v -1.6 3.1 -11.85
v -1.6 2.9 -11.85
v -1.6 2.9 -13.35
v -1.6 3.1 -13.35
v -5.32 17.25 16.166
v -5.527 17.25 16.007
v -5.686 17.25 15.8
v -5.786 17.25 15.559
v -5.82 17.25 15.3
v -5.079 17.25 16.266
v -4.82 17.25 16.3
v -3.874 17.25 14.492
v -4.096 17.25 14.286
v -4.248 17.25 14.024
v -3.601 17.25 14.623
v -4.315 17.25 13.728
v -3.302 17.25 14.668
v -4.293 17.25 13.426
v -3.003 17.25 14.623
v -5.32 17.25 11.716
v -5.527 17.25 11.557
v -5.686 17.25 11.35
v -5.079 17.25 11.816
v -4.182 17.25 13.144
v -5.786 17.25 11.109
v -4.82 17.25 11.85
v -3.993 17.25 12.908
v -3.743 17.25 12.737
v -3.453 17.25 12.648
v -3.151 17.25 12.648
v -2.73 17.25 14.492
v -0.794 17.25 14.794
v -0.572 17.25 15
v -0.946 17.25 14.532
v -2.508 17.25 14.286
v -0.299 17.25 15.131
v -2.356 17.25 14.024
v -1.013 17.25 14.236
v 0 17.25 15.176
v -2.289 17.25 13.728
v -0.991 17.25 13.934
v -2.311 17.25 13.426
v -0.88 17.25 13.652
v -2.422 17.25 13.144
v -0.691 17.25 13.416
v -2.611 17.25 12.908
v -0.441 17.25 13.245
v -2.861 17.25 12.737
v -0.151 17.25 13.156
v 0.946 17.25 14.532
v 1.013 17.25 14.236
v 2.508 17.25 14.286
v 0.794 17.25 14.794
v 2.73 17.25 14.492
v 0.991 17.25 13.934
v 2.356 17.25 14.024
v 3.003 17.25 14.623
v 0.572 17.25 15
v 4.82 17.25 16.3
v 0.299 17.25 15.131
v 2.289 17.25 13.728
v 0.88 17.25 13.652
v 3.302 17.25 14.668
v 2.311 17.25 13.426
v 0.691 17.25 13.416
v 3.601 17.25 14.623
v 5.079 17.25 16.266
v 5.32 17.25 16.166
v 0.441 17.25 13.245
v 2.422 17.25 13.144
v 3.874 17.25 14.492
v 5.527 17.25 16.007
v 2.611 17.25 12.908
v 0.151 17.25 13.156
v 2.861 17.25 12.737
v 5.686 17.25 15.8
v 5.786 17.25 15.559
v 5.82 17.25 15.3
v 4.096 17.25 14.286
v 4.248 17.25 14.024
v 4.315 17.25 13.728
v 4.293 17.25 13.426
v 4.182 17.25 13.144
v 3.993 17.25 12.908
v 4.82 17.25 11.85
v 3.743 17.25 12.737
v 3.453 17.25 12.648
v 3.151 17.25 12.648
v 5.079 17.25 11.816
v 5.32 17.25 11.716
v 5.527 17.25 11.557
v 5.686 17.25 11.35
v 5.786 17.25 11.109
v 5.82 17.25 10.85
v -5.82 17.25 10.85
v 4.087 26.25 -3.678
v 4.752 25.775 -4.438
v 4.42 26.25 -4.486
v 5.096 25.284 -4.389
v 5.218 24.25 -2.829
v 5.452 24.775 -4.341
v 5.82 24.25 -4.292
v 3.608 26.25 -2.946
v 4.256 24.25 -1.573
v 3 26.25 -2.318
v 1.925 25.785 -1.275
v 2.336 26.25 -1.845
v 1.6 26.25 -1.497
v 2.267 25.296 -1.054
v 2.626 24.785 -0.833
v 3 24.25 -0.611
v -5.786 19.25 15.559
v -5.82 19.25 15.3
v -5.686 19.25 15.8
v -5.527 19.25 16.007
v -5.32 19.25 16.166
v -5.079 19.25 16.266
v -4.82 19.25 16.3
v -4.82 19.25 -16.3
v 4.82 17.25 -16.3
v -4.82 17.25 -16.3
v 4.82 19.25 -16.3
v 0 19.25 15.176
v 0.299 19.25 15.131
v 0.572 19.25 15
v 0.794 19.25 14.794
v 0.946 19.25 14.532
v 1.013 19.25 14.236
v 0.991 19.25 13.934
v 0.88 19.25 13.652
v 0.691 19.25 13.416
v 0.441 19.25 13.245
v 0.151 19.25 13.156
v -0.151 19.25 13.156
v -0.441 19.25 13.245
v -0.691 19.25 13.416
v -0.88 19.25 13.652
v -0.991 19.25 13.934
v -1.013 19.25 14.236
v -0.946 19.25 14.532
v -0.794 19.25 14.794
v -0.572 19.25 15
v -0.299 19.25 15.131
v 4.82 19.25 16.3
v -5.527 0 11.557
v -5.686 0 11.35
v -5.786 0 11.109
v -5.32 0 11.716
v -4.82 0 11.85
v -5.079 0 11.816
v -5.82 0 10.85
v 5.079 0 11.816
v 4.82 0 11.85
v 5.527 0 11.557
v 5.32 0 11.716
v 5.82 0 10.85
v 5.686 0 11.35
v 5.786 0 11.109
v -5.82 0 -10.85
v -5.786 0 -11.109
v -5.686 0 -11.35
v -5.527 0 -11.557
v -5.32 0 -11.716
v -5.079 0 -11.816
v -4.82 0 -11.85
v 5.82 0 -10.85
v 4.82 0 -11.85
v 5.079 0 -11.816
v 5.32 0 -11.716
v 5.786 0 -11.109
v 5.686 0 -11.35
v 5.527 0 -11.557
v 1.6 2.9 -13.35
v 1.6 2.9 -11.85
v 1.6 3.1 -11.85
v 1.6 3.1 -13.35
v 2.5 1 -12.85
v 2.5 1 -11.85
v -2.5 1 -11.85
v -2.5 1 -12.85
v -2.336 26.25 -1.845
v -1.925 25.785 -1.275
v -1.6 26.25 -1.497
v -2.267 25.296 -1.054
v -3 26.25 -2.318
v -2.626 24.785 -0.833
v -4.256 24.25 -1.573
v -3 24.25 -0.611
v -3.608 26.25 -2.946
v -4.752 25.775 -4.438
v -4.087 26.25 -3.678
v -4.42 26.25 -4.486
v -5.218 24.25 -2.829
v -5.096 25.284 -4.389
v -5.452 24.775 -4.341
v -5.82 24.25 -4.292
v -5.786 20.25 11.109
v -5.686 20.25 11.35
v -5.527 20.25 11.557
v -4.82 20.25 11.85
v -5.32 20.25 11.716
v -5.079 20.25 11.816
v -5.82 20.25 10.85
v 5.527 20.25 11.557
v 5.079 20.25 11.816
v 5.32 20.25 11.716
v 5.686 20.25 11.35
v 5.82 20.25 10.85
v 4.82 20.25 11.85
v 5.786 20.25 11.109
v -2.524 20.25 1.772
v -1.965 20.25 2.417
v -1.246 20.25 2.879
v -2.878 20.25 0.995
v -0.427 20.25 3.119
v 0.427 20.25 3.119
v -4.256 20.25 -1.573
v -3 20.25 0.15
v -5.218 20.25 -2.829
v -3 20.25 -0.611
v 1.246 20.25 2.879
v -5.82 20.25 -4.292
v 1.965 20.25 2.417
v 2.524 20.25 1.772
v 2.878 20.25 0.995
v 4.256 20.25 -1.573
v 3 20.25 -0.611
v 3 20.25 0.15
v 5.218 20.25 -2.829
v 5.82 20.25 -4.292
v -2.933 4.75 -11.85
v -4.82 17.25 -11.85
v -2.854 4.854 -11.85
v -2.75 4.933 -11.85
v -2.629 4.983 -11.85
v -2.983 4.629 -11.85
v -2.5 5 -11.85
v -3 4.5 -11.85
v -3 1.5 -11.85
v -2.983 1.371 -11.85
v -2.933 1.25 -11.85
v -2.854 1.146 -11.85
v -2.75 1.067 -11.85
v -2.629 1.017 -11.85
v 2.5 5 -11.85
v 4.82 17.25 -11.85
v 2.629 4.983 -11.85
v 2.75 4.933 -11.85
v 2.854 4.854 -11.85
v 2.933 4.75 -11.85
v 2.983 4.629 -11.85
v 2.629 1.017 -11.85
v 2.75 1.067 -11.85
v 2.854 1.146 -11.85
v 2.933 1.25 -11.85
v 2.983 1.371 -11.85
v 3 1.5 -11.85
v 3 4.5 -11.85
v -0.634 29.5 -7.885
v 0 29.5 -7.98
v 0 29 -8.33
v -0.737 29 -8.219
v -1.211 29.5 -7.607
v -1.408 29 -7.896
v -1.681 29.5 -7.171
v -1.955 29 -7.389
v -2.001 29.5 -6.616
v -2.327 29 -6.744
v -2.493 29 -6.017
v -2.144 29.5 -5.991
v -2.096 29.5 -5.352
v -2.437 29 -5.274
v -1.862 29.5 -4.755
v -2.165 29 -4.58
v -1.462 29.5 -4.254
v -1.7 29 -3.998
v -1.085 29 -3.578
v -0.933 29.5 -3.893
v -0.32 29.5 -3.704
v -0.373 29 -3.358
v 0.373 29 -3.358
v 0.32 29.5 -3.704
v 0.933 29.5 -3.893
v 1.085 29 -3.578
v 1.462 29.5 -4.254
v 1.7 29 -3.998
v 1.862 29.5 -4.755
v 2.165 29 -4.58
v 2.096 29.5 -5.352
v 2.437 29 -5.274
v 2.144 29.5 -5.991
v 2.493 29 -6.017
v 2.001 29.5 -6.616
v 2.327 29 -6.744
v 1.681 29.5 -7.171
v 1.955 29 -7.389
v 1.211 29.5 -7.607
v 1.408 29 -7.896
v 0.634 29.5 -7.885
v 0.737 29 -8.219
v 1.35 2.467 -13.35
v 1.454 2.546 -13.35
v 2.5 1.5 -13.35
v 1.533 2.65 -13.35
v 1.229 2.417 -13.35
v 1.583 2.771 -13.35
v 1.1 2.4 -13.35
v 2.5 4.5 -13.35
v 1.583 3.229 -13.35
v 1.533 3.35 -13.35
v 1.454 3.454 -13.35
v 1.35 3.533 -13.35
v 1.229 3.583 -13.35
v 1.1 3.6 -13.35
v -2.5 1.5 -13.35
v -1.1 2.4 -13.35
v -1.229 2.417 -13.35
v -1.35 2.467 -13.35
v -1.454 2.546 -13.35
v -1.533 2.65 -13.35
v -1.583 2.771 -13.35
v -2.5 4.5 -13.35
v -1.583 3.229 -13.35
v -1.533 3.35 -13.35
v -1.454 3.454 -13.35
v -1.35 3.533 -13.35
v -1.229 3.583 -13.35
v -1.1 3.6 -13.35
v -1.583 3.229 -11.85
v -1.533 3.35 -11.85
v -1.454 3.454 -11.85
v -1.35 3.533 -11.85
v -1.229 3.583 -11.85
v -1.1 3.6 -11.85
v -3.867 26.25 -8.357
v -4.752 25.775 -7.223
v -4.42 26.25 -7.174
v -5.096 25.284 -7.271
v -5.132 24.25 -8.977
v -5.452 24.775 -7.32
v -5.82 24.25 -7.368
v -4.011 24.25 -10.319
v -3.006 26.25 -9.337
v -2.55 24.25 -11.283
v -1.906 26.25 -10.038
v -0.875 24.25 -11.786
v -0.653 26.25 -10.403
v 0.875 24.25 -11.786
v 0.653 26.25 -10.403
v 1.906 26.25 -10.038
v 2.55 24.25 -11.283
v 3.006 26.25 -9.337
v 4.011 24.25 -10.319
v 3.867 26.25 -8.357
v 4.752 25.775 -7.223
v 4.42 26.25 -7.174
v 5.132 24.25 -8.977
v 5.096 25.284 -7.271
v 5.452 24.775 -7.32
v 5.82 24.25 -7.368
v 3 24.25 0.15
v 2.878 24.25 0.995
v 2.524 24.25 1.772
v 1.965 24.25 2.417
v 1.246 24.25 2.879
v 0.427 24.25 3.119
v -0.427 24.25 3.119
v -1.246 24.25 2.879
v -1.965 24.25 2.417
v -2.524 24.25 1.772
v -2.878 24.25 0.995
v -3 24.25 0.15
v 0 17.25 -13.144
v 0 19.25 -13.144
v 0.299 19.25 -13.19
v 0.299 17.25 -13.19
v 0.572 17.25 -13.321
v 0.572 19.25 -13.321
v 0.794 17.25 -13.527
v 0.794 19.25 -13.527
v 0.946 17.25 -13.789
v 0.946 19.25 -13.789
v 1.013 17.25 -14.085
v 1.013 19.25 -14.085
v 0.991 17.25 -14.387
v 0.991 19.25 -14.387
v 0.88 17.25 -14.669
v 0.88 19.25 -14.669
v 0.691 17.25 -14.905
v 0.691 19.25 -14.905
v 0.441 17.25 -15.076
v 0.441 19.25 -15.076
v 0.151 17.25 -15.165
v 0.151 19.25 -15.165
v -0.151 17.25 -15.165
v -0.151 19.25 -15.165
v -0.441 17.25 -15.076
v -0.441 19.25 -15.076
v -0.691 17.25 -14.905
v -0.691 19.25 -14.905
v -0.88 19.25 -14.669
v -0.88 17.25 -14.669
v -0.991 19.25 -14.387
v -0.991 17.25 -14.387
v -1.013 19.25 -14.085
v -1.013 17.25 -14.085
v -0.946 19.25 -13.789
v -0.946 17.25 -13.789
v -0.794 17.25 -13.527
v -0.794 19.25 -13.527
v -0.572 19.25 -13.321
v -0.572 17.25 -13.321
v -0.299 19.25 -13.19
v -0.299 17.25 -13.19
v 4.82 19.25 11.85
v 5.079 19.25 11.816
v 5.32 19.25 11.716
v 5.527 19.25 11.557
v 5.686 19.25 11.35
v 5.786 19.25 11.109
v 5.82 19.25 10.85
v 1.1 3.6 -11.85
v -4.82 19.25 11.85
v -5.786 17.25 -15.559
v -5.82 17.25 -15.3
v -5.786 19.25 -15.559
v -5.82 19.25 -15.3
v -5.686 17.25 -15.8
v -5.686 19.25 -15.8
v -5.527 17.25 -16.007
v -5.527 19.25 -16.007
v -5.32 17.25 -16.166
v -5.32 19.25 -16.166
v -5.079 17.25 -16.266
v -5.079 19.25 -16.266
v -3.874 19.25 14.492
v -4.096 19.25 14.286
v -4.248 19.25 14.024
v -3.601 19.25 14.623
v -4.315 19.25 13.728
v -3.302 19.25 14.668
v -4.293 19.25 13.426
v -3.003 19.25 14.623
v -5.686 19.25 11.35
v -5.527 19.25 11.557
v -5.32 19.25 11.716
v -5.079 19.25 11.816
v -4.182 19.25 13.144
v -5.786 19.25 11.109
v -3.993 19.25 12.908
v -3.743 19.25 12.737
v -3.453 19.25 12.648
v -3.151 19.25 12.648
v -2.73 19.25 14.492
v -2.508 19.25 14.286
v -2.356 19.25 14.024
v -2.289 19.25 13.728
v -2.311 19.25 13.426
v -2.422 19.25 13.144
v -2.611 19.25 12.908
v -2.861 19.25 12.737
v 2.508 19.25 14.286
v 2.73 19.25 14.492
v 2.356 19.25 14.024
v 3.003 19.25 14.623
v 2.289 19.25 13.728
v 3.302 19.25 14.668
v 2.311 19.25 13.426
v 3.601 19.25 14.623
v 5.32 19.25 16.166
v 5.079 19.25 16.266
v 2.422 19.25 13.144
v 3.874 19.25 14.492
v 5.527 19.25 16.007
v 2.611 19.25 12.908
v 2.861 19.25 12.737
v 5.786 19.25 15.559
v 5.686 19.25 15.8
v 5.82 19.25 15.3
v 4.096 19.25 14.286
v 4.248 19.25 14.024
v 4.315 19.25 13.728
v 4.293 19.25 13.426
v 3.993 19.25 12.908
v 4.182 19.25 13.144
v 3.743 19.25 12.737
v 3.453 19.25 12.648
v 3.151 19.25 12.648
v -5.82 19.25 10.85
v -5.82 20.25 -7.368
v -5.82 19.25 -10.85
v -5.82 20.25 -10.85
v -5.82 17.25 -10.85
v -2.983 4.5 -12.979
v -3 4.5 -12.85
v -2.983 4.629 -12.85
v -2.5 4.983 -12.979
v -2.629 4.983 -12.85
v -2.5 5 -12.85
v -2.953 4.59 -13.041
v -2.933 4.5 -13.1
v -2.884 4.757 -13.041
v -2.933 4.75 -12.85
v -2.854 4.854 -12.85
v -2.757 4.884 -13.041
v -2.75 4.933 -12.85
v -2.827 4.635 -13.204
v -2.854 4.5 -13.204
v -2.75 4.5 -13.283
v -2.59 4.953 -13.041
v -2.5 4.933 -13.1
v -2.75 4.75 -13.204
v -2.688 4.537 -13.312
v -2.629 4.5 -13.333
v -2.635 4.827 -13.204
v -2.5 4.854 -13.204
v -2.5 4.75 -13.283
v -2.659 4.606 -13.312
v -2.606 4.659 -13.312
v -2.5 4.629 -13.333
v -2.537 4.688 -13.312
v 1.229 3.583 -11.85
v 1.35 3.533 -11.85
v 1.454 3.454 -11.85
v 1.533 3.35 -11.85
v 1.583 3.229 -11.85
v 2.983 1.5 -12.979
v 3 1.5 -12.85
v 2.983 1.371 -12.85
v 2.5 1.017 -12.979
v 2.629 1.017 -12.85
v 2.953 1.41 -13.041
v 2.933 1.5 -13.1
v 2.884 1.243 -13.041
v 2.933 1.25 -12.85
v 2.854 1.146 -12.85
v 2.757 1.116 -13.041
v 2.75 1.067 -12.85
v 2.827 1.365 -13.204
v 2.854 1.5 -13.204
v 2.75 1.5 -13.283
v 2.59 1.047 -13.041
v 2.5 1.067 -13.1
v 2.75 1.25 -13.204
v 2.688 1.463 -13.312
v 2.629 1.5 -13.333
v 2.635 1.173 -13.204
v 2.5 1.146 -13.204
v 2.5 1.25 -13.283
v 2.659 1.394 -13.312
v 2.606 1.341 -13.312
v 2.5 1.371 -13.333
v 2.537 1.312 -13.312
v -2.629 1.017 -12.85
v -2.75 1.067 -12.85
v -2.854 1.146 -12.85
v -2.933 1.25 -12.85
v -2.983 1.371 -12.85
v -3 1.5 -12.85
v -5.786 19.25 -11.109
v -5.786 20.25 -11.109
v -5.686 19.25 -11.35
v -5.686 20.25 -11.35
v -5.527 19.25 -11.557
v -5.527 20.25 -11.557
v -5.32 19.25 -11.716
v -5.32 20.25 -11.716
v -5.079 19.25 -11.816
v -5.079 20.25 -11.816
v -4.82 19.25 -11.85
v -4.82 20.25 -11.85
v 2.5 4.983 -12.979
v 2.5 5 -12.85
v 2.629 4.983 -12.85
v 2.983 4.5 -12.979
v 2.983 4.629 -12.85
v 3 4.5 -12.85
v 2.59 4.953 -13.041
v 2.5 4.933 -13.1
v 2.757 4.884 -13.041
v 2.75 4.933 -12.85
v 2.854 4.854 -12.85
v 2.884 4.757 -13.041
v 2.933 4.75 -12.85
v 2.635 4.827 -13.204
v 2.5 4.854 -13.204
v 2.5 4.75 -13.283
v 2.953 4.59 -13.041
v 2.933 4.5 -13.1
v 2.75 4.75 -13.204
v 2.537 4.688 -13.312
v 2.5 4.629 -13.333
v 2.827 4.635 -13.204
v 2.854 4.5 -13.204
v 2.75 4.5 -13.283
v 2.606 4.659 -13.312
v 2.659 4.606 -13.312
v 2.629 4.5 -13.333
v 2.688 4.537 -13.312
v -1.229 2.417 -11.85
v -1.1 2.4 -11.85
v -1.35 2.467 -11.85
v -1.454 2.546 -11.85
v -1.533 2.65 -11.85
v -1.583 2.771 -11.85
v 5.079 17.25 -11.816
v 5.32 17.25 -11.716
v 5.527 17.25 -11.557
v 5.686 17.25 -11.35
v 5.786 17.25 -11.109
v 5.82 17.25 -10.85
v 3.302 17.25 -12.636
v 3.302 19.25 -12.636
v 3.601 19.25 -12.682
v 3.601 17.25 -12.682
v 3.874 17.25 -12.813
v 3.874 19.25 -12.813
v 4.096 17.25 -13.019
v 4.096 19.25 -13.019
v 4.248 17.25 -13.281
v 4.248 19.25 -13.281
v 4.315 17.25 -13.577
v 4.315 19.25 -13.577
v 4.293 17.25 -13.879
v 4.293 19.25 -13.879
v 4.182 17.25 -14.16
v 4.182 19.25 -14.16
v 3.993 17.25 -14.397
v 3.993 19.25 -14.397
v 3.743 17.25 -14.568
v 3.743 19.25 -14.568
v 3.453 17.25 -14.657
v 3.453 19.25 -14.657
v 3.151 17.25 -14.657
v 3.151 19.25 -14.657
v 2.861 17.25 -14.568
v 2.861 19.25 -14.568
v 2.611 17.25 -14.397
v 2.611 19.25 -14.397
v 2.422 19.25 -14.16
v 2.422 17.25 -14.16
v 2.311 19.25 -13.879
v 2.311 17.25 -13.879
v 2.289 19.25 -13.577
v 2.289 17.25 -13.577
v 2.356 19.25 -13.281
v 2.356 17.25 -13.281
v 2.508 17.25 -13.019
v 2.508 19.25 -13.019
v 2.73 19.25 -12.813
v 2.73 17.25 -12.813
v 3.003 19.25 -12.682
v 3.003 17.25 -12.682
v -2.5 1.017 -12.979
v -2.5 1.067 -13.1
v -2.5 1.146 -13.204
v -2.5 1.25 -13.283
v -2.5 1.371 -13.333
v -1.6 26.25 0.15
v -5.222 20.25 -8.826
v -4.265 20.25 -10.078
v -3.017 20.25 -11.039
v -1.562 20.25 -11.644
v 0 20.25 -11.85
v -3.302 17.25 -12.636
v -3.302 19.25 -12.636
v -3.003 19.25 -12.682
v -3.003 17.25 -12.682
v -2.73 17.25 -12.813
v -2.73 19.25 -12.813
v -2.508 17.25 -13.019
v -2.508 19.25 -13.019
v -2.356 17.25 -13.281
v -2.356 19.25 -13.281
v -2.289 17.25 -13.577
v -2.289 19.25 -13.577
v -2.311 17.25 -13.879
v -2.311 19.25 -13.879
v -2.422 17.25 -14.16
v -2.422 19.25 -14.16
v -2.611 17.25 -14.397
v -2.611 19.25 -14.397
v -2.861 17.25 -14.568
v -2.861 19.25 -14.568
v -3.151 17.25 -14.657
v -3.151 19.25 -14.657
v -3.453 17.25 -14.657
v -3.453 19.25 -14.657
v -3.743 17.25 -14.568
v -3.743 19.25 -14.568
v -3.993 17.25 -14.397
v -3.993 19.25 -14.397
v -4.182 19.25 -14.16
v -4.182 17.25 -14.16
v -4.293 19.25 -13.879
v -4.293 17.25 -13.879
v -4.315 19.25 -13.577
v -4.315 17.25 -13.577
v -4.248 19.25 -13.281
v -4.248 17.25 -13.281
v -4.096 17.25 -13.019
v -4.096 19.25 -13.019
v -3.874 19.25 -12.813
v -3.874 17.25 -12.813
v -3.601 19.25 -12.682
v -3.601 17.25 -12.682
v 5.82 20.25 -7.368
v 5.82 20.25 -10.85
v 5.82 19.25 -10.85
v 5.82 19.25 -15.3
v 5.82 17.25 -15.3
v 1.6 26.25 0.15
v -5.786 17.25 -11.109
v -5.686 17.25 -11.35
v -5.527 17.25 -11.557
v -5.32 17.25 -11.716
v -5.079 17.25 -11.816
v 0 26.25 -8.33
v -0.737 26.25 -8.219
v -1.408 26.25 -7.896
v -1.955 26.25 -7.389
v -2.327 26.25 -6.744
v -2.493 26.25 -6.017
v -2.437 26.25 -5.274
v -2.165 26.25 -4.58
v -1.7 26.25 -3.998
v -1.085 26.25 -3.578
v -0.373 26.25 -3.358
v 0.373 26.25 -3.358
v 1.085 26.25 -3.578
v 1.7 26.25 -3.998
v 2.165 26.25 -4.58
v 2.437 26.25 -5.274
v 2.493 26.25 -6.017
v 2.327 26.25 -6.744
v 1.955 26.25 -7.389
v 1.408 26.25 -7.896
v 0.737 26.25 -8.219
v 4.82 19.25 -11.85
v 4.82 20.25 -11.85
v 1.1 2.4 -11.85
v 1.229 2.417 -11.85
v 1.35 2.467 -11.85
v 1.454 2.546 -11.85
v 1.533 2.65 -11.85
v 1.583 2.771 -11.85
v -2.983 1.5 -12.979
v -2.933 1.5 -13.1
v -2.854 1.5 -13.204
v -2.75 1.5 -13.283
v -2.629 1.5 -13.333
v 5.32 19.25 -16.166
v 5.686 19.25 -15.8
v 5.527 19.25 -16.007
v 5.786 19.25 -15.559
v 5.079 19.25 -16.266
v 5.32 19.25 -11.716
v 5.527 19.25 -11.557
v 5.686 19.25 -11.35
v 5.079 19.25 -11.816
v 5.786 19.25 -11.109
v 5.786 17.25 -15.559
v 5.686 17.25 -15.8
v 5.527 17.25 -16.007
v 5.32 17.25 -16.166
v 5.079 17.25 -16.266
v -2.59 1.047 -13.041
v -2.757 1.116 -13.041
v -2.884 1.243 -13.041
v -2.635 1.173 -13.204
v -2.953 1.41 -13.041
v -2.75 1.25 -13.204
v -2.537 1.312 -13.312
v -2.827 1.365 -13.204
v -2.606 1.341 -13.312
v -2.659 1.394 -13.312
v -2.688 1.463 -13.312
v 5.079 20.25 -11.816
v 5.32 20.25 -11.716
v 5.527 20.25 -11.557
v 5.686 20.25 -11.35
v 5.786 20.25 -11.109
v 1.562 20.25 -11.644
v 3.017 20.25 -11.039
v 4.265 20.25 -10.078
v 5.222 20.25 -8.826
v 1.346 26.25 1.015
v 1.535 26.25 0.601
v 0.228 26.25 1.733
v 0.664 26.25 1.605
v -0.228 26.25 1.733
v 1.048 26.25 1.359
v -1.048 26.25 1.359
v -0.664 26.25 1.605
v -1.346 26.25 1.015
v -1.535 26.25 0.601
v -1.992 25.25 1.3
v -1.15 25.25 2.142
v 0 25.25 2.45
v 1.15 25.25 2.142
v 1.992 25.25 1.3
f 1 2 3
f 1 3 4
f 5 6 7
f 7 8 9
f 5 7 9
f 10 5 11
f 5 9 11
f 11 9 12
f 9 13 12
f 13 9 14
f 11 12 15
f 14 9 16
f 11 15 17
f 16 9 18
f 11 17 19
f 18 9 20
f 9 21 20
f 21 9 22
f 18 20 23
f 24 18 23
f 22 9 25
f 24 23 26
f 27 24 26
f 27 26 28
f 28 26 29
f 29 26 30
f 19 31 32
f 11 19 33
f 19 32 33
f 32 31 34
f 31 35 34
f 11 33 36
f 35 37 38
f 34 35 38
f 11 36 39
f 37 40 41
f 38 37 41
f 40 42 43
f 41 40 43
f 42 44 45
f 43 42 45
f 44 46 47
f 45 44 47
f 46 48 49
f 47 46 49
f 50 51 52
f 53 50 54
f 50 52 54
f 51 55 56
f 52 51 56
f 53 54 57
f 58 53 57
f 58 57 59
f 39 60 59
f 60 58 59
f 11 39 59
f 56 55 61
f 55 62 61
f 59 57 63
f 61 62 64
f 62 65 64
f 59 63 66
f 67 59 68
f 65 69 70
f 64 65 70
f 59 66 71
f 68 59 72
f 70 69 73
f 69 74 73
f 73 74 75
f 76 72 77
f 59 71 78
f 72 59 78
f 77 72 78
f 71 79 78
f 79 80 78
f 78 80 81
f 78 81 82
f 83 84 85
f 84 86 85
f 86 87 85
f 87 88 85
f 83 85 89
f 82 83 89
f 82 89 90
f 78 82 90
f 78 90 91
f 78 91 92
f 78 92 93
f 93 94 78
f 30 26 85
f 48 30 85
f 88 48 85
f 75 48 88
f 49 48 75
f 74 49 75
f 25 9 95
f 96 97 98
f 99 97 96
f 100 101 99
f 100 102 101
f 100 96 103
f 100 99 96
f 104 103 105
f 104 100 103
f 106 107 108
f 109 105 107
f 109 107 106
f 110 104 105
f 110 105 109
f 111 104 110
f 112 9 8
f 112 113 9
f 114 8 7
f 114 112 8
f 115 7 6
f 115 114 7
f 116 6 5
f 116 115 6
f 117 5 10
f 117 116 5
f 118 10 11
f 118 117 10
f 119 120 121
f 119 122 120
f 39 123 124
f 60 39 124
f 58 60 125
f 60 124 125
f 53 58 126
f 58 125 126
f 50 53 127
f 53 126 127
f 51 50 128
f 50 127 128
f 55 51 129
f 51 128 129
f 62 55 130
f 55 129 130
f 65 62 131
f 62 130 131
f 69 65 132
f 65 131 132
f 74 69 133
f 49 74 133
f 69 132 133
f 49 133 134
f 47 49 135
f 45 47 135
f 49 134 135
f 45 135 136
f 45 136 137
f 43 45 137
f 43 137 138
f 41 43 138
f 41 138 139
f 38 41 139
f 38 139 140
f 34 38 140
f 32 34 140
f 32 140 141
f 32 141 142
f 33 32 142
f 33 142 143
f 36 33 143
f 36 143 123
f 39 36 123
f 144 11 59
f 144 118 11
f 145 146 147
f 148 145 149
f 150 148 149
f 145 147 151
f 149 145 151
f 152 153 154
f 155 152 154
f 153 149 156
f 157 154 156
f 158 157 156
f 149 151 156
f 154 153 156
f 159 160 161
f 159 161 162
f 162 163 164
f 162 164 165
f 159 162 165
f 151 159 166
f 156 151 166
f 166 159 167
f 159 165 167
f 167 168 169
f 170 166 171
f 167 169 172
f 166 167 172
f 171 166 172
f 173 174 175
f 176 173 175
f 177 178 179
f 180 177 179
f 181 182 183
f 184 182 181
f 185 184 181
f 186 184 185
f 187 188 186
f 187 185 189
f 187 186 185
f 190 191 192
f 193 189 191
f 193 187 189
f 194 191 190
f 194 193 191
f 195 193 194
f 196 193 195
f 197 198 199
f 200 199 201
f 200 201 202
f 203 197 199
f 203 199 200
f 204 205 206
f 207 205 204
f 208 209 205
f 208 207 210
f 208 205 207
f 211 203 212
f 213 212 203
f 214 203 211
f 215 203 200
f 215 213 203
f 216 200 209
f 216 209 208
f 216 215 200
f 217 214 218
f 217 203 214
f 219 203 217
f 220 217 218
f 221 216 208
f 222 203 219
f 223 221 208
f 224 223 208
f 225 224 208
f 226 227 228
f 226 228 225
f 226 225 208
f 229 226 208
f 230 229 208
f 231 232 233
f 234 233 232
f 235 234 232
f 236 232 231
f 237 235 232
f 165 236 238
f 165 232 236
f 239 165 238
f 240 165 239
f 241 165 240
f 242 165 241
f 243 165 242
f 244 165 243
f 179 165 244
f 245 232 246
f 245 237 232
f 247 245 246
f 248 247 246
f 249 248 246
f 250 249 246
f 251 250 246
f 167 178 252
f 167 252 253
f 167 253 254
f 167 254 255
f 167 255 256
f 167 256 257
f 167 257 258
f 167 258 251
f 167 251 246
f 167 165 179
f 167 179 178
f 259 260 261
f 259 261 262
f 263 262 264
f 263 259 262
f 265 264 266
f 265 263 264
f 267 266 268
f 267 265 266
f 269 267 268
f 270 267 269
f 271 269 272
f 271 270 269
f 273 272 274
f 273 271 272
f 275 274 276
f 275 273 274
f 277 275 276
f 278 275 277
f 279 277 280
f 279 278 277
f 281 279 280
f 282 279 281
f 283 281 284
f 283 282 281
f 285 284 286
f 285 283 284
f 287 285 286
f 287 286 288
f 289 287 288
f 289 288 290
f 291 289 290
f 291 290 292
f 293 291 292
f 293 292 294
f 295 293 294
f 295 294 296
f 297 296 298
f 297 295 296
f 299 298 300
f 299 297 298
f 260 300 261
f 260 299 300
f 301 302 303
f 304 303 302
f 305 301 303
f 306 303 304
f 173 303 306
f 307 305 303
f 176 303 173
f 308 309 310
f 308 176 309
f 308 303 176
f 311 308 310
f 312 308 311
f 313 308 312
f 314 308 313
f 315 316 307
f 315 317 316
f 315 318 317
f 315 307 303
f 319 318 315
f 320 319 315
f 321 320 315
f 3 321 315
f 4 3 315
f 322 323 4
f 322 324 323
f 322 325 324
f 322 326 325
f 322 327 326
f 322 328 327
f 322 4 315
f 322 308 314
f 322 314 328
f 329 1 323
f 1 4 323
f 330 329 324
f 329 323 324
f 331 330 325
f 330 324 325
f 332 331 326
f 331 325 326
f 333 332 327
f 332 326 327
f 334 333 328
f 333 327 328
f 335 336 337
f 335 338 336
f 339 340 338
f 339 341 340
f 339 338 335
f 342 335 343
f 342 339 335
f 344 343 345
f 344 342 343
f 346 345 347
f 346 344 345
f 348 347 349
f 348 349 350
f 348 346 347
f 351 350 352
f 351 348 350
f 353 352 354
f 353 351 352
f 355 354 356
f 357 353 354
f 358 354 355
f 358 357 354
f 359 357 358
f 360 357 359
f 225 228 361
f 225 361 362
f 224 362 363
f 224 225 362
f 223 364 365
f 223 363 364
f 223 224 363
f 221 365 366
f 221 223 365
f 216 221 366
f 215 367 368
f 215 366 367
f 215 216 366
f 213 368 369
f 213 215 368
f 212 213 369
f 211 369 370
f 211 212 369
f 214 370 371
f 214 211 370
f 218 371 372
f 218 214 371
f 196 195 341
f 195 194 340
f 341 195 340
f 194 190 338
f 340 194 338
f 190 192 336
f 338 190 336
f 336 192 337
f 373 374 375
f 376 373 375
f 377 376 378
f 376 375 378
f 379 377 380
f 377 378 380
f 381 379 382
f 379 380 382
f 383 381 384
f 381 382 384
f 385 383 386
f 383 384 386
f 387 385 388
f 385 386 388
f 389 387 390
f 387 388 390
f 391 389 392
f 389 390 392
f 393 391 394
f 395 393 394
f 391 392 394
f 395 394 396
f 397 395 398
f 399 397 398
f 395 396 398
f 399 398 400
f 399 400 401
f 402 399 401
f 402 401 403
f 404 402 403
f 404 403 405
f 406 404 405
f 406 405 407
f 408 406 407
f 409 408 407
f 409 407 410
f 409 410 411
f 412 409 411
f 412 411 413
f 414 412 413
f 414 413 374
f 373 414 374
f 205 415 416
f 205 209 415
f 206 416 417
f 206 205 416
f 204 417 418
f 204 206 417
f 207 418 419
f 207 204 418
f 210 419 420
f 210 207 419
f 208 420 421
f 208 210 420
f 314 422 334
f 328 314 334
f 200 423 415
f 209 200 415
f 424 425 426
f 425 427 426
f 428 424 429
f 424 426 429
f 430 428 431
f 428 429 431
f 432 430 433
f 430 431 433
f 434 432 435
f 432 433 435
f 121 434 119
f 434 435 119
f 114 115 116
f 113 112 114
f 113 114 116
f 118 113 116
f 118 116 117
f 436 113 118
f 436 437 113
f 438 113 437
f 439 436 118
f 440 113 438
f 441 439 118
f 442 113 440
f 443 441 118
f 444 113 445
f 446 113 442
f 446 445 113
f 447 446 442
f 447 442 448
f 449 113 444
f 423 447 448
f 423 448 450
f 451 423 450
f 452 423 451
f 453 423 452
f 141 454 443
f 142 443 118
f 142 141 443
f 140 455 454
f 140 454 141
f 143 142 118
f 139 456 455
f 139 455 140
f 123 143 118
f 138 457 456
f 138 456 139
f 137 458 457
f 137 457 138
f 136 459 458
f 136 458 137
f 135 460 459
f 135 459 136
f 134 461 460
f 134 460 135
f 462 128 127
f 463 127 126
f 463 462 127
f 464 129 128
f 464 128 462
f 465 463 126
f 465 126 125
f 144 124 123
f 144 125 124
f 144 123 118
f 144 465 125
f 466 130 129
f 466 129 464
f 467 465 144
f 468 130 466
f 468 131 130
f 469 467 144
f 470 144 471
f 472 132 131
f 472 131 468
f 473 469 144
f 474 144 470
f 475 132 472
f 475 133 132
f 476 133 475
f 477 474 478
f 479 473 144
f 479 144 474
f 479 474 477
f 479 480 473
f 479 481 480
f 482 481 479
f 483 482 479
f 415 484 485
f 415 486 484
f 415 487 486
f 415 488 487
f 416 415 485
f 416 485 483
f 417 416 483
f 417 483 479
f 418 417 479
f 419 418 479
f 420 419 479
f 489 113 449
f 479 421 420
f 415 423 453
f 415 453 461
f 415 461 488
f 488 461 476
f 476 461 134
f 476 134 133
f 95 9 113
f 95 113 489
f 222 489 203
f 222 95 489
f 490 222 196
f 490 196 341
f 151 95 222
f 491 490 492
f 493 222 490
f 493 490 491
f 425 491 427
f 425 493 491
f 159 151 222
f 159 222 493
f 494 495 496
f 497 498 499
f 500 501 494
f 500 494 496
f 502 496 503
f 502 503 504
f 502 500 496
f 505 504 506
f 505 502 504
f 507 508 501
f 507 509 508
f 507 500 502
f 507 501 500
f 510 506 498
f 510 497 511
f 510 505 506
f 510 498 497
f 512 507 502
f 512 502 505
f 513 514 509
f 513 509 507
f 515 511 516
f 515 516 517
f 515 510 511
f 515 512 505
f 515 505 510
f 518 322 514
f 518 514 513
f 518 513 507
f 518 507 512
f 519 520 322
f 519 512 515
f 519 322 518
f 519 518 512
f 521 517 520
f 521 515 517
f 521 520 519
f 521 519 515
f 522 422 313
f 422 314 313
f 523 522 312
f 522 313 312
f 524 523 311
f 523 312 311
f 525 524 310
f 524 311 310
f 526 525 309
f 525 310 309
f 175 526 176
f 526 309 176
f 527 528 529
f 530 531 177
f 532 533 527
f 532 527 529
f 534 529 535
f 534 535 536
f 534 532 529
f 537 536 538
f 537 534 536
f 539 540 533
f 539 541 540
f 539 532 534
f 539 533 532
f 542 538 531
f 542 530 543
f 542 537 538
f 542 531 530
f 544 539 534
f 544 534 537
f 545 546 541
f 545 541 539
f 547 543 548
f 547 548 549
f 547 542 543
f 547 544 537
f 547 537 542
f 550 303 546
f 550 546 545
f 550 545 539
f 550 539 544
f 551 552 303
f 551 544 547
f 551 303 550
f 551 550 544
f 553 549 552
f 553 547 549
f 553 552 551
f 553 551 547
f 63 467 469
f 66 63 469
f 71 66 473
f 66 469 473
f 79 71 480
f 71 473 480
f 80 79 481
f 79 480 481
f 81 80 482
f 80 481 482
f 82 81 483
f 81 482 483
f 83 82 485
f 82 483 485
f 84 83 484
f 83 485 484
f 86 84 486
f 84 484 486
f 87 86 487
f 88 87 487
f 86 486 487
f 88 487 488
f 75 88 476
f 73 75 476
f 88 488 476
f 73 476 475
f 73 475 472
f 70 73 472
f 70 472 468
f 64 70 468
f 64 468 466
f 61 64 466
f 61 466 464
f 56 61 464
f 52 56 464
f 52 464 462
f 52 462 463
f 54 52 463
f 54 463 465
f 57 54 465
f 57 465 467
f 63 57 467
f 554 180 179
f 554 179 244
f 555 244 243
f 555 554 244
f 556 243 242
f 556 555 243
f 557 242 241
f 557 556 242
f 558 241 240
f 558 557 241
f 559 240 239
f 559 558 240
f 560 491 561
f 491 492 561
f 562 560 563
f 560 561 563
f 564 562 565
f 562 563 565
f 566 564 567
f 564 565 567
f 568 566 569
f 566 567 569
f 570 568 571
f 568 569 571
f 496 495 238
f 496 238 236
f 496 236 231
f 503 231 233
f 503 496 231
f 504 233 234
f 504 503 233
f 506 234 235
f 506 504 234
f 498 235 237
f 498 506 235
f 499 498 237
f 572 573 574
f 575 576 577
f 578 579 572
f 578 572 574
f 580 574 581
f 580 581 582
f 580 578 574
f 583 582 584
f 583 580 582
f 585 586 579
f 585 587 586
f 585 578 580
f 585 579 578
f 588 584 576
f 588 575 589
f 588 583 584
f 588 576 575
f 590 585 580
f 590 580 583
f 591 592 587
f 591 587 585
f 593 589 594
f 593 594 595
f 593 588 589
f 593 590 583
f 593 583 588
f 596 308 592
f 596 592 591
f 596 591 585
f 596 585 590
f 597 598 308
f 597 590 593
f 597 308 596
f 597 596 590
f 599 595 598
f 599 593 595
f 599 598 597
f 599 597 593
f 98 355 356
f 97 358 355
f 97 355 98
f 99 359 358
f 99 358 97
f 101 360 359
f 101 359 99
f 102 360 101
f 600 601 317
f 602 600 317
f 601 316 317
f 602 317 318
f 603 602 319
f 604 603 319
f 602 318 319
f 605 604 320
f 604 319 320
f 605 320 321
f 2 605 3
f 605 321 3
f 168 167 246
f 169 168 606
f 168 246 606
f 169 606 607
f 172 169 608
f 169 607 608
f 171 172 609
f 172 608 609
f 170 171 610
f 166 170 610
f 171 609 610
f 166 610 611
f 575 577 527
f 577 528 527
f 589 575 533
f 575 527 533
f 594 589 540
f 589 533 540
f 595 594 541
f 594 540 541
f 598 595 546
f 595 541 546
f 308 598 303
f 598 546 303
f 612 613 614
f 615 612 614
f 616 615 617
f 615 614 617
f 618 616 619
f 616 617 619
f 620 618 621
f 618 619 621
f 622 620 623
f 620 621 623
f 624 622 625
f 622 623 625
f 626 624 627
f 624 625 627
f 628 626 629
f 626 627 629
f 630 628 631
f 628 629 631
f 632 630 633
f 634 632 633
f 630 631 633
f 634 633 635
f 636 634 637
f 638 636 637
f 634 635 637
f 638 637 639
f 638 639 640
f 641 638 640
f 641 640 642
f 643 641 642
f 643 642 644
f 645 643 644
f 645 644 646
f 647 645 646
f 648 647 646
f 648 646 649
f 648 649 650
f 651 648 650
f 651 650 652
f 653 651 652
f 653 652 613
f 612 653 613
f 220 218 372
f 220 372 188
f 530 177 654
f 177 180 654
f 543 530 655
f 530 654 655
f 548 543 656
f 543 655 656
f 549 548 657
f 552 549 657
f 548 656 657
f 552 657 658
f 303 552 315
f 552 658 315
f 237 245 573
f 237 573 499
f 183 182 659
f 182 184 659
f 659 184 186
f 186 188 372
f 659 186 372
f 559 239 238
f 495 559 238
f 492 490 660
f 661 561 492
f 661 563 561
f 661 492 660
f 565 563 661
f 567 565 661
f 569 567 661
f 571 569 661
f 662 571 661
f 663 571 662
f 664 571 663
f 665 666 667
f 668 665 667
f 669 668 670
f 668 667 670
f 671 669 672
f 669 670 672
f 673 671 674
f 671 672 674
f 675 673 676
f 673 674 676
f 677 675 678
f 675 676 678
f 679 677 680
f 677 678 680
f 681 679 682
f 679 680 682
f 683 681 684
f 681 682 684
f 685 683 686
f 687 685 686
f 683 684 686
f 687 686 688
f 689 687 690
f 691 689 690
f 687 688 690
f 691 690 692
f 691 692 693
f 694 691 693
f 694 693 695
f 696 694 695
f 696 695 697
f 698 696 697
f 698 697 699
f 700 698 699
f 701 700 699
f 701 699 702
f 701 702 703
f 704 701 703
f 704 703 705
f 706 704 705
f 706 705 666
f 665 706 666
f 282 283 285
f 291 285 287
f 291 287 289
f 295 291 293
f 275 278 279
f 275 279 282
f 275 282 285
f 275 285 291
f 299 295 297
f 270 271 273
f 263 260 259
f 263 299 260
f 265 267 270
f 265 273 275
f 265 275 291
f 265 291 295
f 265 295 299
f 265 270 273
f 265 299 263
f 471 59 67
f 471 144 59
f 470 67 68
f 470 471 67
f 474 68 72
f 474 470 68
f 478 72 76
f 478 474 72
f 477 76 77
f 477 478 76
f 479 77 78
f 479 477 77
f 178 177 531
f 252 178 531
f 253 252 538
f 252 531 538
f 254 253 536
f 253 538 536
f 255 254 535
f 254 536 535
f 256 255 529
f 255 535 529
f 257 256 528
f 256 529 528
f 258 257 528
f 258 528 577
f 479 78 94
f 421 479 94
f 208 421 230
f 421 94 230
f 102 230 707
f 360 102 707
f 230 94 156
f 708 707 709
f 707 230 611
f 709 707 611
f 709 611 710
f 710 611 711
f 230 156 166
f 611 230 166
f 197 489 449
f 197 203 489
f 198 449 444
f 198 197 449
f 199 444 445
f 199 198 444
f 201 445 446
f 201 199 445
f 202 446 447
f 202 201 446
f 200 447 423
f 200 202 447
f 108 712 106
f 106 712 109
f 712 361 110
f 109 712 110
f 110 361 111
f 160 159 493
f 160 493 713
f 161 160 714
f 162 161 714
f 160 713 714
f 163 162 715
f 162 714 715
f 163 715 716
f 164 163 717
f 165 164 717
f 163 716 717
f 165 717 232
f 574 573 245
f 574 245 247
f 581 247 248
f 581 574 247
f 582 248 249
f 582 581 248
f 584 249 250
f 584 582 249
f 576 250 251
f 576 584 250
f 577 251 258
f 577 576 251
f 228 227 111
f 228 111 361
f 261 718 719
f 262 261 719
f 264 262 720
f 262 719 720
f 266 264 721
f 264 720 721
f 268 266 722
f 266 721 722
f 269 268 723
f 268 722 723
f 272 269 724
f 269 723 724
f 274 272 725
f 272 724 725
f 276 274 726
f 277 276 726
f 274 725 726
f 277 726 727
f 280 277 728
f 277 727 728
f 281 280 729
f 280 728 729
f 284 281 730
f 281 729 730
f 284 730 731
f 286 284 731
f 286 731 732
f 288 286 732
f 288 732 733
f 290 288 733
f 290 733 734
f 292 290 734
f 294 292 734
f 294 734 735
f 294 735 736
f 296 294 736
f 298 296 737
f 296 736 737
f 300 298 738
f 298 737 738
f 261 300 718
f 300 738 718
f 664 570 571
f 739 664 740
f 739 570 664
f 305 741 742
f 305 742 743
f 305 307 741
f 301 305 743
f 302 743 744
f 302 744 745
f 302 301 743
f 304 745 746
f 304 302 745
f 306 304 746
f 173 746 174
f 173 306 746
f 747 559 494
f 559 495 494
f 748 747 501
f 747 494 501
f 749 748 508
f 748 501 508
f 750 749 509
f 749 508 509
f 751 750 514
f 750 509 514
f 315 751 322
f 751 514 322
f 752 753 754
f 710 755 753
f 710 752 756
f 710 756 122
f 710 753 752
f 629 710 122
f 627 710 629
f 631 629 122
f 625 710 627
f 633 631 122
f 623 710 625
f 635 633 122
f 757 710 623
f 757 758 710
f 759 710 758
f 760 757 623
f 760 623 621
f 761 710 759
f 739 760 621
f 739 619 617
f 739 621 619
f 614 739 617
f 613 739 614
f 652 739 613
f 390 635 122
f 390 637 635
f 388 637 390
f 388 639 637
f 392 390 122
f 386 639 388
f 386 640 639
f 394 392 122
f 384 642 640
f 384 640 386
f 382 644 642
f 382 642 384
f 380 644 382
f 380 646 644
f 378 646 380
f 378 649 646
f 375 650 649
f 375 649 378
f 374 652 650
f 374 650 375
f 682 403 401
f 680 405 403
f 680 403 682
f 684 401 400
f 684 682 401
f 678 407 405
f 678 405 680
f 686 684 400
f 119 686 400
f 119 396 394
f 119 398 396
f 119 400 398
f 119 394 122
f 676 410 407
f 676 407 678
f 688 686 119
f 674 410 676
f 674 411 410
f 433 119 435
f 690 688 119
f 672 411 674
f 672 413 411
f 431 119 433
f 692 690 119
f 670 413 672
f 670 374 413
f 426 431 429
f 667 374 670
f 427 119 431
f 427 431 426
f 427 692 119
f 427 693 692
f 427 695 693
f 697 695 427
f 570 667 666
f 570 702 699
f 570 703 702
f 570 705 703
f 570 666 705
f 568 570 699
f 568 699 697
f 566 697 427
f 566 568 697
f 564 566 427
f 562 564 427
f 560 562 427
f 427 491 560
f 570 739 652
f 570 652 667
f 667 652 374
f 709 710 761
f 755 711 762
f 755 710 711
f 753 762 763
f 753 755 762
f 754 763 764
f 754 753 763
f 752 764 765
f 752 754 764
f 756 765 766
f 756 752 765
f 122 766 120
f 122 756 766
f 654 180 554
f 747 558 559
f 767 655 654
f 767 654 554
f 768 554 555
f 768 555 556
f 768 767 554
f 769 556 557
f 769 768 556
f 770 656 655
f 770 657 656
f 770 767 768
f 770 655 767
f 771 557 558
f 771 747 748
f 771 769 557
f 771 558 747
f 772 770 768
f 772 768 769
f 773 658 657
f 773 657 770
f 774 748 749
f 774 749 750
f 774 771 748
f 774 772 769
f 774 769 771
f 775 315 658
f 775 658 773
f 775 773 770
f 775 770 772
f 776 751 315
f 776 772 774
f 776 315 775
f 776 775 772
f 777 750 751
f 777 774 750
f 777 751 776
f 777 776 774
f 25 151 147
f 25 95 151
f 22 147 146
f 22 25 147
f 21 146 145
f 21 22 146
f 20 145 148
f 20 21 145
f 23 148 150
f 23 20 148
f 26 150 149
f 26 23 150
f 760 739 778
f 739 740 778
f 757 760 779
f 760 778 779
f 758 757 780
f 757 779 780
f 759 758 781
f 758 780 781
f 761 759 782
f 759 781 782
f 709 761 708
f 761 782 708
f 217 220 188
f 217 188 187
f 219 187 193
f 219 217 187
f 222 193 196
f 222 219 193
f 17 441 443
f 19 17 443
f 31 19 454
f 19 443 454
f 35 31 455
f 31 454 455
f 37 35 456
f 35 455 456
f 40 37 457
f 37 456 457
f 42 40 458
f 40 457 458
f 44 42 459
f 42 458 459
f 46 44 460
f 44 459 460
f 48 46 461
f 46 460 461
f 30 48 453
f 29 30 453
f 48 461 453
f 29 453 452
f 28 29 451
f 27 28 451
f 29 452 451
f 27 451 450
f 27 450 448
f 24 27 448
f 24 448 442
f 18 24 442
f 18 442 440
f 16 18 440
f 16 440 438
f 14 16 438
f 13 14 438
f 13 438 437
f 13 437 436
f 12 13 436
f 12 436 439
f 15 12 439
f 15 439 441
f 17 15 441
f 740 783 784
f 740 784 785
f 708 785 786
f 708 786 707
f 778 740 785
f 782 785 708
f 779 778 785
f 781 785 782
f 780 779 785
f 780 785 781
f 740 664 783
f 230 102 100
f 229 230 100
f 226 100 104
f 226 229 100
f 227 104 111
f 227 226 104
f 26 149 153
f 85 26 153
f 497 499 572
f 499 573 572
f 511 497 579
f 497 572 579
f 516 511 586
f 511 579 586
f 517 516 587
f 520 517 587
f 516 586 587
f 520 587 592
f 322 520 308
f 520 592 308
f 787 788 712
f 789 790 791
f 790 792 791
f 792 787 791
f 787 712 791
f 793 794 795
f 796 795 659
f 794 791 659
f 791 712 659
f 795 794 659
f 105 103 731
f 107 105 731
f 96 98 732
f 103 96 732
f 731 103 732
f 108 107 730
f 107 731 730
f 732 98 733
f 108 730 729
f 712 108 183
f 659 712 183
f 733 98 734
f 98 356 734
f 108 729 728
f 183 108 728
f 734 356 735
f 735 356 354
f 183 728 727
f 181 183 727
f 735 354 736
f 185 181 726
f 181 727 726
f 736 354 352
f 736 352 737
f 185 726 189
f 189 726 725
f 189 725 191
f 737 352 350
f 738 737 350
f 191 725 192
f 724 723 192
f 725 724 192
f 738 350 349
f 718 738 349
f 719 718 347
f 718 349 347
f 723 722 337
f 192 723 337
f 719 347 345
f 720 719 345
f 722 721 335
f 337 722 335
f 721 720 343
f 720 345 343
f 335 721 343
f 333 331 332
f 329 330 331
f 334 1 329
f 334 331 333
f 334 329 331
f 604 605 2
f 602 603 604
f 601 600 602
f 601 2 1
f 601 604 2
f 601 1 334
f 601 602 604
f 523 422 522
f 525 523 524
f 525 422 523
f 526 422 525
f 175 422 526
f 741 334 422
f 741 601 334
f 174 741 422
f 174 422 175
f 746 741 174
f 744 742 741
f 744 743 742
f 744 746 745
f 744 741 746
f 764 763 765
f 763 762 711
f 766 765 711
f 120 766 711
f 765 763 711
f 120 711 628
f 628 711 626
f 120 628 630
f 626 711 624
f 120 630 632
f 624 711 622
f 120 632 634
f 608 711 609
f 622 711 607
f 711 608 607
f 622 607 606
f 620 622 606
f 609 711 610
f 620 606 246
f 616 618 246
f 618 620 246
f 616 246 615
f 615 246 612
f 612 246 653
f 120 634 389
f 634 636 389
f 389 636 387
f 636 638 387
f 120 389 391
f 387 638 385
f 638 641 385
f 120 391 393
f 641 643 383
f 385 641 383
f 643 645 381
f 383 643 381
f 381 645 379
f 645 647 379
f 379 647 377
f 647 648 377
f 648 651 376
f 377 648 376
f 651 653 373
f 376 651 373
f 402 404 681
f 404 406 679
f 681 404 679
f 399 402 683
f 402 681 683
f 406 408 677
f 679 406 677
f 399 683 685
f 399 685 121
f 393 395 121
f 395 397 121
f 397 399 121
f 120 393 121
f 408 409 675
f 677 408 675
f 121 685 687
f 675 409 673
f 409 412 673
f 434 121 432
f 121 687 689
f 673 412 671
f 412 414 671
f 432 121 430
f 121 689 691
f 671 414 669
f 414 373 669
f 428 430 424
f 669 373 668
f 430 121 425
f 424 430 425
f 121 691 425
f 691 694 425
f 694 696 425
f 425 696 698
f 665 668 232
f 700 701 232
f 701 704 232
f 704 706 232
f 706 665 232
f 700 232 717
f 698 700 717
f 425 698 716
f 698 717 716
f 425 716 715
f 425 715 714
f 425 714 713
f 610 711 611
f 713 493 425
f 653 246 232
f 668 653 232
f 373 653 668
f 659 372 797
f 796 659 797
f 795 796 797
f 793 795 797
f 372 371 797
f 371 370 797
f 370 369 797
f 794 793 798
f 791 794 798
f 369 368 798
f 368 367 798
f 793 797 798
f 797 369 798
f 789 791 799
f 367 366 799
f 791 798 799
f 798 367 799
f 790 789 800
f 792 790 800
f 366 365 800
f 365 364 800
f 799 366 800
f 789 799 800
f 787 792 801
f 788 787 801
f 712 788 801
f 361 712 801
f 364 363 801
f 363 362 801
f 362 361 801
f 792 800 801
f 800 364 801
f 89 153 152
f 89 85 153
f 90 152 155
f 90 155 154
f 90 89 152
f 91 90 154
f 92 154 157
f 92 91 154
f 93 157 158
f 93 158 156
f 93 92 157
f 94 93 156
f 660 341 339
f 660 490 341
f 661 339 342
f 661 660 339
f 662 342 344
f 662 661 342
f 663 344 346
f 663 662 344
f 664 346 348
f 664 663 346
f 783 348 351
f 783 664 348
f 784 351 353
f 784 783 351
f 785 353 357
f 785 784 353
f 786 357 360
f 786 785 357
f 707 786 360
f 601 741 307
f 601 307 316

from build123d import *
from OCP.BRepFilletAPI import BRepFilletAPI_MakeChamfer

# Parameters (mm, degrees)
SKETCH1_W           = 11.64
SKETCH1_H           = 23.7
BOSS_EXTRUDE1_DEPTH = 20.25
SKETCH2_W           = 11.64
SKETCH2_H           = 2
BOSS_EXTRUDE2_DEPTH = 4.45
SKETCH3_W           = 11.64
SKETCH3_H           = 2
BOSS_EXTRUDE3_DEPTH = 4.45
FILLET1_R           = 1
BOSS_EXTRUDE4_DEPTH = 6
CHAMFER2_SIZE2      = 1.400415076
CHAMFER2_SIZE       = 2
SKETCH5_R           = 2.5
BOSS_EXTRUDE5_DEPTH = 3.25
SKETCH6_W           = 6
SKETCH6_H           = 4
SKETCH6_W_2         = 3.2
SKETCH6_H_2         = 1.2
BOSS_EXTRUDE6_DEPTH = 1.5
FILLET2_R           = 0.5
CHAMFER3_SIZE       = 0.5
CHAMFER3_SIZE2      = 0.350103769
CUT_EXTRUDE1_REACH  = 27.887
SKETCH7_R           = 1.016
FILLET3_R           = 0.5


with BuildPart() as part:
    # Sketch1 → Boss-Extrude1 (new body)
    with BuildSketch(Plane(origin=(0, 0, 0), x_dir=(1, 0, 0), z_dir=(0, 1, 0))):
        Rectangle(SKETCH1_W, SKETCH1_H)
    extrude(amount=BOSS_EXTRUDE1_DEPTH)

    # Sketch2 → Boss-Extrude2 (add)
    with BuildSketch(Plane.XY.offset(11.85)):
        with Locations((0, 18.25)):
            Rectangle(SKETCH2_W, SKETCH2_H)
    extrude(amount=BOSS_EXTRUDE2_DEPTH)

    # Sketch3 → Boss-Extrude3 (add)
    with BuildSketch(Plane(origin=(0, 0, -11.85), x_dir=(-1, 0, 0), z_dir=(0, 0, -1))):
        with Locations((0, 18.25)):
            Rectangle(SKETCH3_W, SKETCH3_H)
    extrude(amount=BOSS_EXTRUDE3_DEPTH)

    # Fillet1
    fillet1_edges = [part.edges().sort_by_distance(p)[0] for p in [
        (5.82, 8.625, 11.85),
        (-5.82, 8.625, 11.85),
        (5.82, 18.25, 16.3),
        (-5.82, 18.25, 16.3),
        (-5.82, 8.625, -11.85),
        (5.82, 8.625, -11.85),
        (-5.82, 18.25, -16.3),
        (5.82, 18.25, -16.3),
        (5.82, 19.75, 11.85),
        (-5.82, 19.75, 11.85),
        (-5.82, 19.75, -11.85),
        (5.82, 19.75, -11.85),
    ]]
    fillet(fillet1_edges, radius=FILLET1_R)

    # Sketch4 → Boss-Extrude4 (add)
    with BuildSketch(Plane(origin=(0, 20.25, 0), x_dir=(1, 0, 0), z_dir=(0, 1, 0))):
        with BuildLine():
            Line((-3, -0.15), (-3, 0.611197026))
            ThreePointArc((-3, 0.611197026), (-4.778645953, 2.169252733), (-5.82, 4.292151873))
            Line((-5.82, 4.292151873), (-5.82, 7.368248127))
            ThreePointArc((-5.82, 7.368248127), (0, 11.85), (5.82, 7.368248127))
            Line((5.82, 7.368248127), (5.82, 4.292151873))
            ThreePointArc((5.82, 4.292151873), (4.778645953, 2.169252733), (3, 0.611197026))
            Line((3, 0.611197026), (3, -0.15))
            ThreePointArc((3, -0.15), (0, -3.15), (-3, -0.15))
        make_face()
    extrude(amount=BOSS_EXTRUDE4_DEPTH)

    # Chamfer2
    chamfer2_edges = [part.edges().sort_by_distance(p)[0] for p in [
        (-5.82, 26.25, -5.8302),
    ]]
    chamfer2_side = [part.faces().sort_by_distance(p)[0] for p in [
        (-5.82, 26.221991698, -5.8302),
    ]]
    chamfer(chamfer2_edges, length=CHAMFER2_SIZE, length2=CHAMFER2_SIZE2, reference=chamfer2_side[0])
    chamfer2_2_edges = [part.edges().sort_by_distance(p)[0] for p in [
        (5.82, 26.25, -5.8302),
    ]]
    chamfer2_2_side = [part.faces().sort_by_distance(p)[0] for p in [
        (5.791991698, 26.25, -5.8302),
    ]]
    chamfer(chamfer2_2_edges, length=CHAMFER2_SIZE2, length2=CHAMFER2_SIZE, reference=chamfer2_2_side[0])
    chamfer2_3_edges = [part.edges().sort_by_distance(p)[0] for p in [
        (3.752705775, 26.25, -1.123269853),
    ]]
    chamfer2_3_side = [part.faces().sort_by_distance(p)[0] for p in [
        (3.735245575, 26.25, -1.14516977),
    ]]
    chamfer(chamfer2_3_edges, length=CHAMFER2_SIZE2, length2=CHAMFER2_SIZE, reference=chamfer2_3_side[0])
    chamfer2_4_edges = [part.edges().sort_by_distance(p)[0] for p in [
        (-3.752705775, 26.25, -1.123269853),
    ]]
    chamfer2_4_side = [part.faces().sort_by_distance(p)[0] for p in [
        (-3.735245575, 26.25, -1.14516977),
    ]]
    chamfer(chamfer2_4_edges, length=CHAMFER2_SIZE2, length2=CHAMFER2_SIZE, reference=chamfer2_4_side[0])
    chamfer2_5_edges_1 = [part.edges().sort_by_distance(p)[0] for p in [
        (3, 26.25, -0.230598513),
    ]]
    chamfer2_5_side_1 = [part.faces().sort_by_distance(p)[0] for p in [
        (2.971991698, 26.25, -0.230598513),
    ]]
    chamfer2_5_edges_2 = [part.edges().sort_by_distance(p)[0] for p in [
        (0, 26.25, 3.15),
    ]]
    chamfer2_5_side_2 = [part.faces().sort_by_distance(p)[0] for p in [
        (0, 26.25, 3.121991698),
    ]]
    chamfer2_5_edges_3 = [part.edges().sort_by_distance(p)[0] for p in [
        (-3, 26.25, -0.230598513),
    ]]
    chamfer2_5_side_3 = [part.faces().sort_by_distance(p)[0] for p in [
        (-2.971991698, 26.25, -0.230598513),
    ]]
    chamfer2_5 = BRepFilletAPI_MakeChamfer(part.part.solid().wrapped)
    for e in chamfer2_5_edges_1:
        chamfer2_5.Add(CHAMFER2_SIZE2, CHAMFER2_SIZE, e.wrapped, chamfer2_5_side_1[0].wrapped)
    for e in chamfer2_5_edges_2:
        chamfer2_5.Add(CHAMFER2_SIZE2, CHAMFER2_SIZE, e.wrapped, chamfer2_5_side_2[0].wrapped)
    for e in chamfer2_5_edges_3:
        chamfer2_5.Add(CHAMFER2_SIZE2, CHAMFER2_SIZE, e.wrapped, chamfer2_5_side_3[0].wrapped)
    add(Compound.cast(chamfer2_5.Shape()), mode=Mode.REPLACE)
    chamfer2_6_edges = [part.edges().sort_by_distance(p)[0] for p in [
        (0, 26.25, -11.85),
    ]]
    chamfer2_6_side = [part.faces().sort_by_distance(p)[0] for p in [
        (0, 26.25, -11.821991698),
    ]]
    chamfer(chamfer2_6_edges, length=CHAMFER2_SIZE2, length2=CHAMFER2_SIZE, reference=chamfer2_6_side[0])

    # Sketch5 → Boss-Extrude5 (add)
    with BuildSketch(Plane(origin=(0, 26.25, 0), x_dir=(1, 0, 0), z_dir=(0, 1, 0))):
        with Locations(Location((0, 5.8302, 0), (0, 0, 90))):
            Circle(SKETCH5_R)
    extrude(amount=BOSS_EXTRUDE5_DEPTH)

    # Sketch6 → Boss-Extrude6 (add)
    with BuildSketch(Plane(origin=(0, 0, -11.85), x_dir=(-1, 0, 0), z_dir=(0, 0, -1))):
        with Locations((0, 3)):
            Rectangle(SKETCH6_W, SKETCH6_H)
        with Locations((0, 3)):
            Rectangle(SKETCH6_W_2, SKETCH6_H_2, mode=Mode.SUBTRACT)
    extrude(amount=BOSS_EXTRUDE6_DEPTH)

    # Fillet2
    fillet2_edges = [part.edges().sort_by_distance(p)[0] for p in [
        (-3, 1, -12.6),
        (-3, 5, -12.6),
        (3, 5, -12.6),
        (3, 1, -12.6),
        (1.6, 3.6, -12.6),
        (1.6, 2.4, -12.6),
        (-1.6, 2.4, -12.6),
        (-1.6, 3.6, -12.6),
    ]]
    fillet(fillet2_edges, radius=FILLET2_R)

    # Chamfer3
    chamfer3_edges = [part.edges().sort_by_distance(p)[0] for p in [
        (0, 29.5, -3.3302),
    ]]
    chamfer3_side = [part.faces().sort_by_distance(p)[0] for p in [
        (0, 27.875, -3.3302),
    ]]
    chamfer(chamfer3_edges, length=CHAMFER3_SIZE, length2=CHAMFER3_SIZE2, reference=chamfer3_side[0])

    # Sketch7 → Cut-Extrude1 (cut, up to next)
    with BuildSketch(Plane(origin=(0, 19.25, 0), x_dir=(1, 0, 0), z_dir=(0, 1, 0)), mode=Mode.PRIVATE) as cut_extrude1_sk1:
        with Locations(Location((0, -14.1605, 0), (0, 0, 270))):
            Circle(SKETCH7_R)
    cut_extrude1_tool1 = extrude(cut_extrude1_sk1.sketch, amount=-CUT_EXTRUDE1_REACH, mode=Mode.PRIVATE) & part.part
    # Sketch7 → Cut-Extrude1 (cut, up to next)
    with BuildSketch(Plane(origin=(0, 19.25, 0), x_dir=(1, 0, 0), z_dir=(0, 1, 0)), mode=Mode.PRIVATE) as cut_extrude1_sk2:
        with Locations(Location((0, 14.1605, 0), (0, 0, 270))):
            Circle(SKETCH7_R)
    cut_extrude1_tool2 = extrude(cut_extrude1_sk2.sketch, amount=-CUT_EXTRUDE1_REACH, mode=Mode.PRIVATE) & part.part
    # Sketch7 → Cut-Extrude1 (cut, up to next)
    with BuildSketch(Plane(origin=(0, 19.25, 0), x_dir=(1, 0, 0), z_dir=(0, 1, 0)), mode=Mode.PRIVATE) as cut_extrude1_sk3:
        with Locations(Location((-3.302, 13.6525, 0), (0, 0, 270))):
            Circle(SKETCH7_R)
    cut_extrude1_tool3 = extrude(cut_extrude1_sk3.sketch, amount=-CUT_EXTRUDE1_REACH, mode=Mode.PRIVATE) & part.part
    # Sketch7 → Cut-Extrude1 (cut, up to next)
    with BuildSketch(Plane(origin=(0, 19.25, 0), x_dir=(1, 0, 0), z_dir=(0, 1, 0)), mode=Mode.PRIVATE) as cut_extrude1_sk4:
        with Locations(Location((3.302, 13.6525, 0), (0, 0, 270))):
            Circle(SKETCH7_R)
    cut_extrude1_tool4 = extrude(cut_extrude1_sk4.sketch, amount=-CUT_EXTRUDE1_REACH, mode=Mode.PRIVATE) & part.part
    # Sketch7 → Cut-Extrude1 (cut, up to next)
    with BuildSketch(Plane(origin=(0, 19.25, 0), x_dir=(1, 0, 0), z_dir=(0, 1, 0)), mode=Mode.PRIVATE) as cut_extrude1_sk5:
        with Locations(Location((-3.302, -13.6525, 0), (0, 0, 270))):
            Circle(SKETCH7_R)
    cut_extrude1_tool5 = extrude(cut_extrude1_sk5.sketch, amount=-CUT_EXTRUDE1_REACH, mode=Mode.PRIVATE) & part.part
    # Sketch7 → Cut-Extrude1 (cut, up to next)
    with BuildSketch(Plane(origin=(0, 19.25, 0), x_dir=(1, 0, 0), z_dir=(0, 1, 0)), mode=Mode.PRIVATE) as cut_extrude1_sk6:
        with Locations(Location((3.302, -13.6525, 0), (0, 0, 270))):
            Circle(SKETCH7_R)
    cut_extrude1_tool6 = extrude(cut_extrude1_sk6.sketch, amount=-CUT_EXTRUDE1_REACH, mode=Mode.PRIVATE) & part.part
    add(cut_extrude1_tool1.solids().sort_by_distance((0, 19.25, 14.1605))[0], mode=Mode.SUBTRACT)
    add(cut_extrude1_tool2.solids().sort_by_distance((0, 19.25, -14.1605))[0], mode=Mode.SUBTRACT)
    add(cut_extrude1_tool3.solids().sort_by_distance((-3.302, 19.25, -13.6525))[0], mode=Mode.SUBTRACT)
    add(cut_extrude1_tool4.solids().sort_by_distance((3.302, 19.25, -13.6525))[0], mode=Mode.SUBTRACT)
    add(cut_extrude1_tool5.solids().sort_by_distance((-3.302, 19.25, 13.6525))[0], mode=Mode.SUBTRACT)
    add(cut_extrude1_tool6.solids().sort_by_distance((3.302, 19.25, 13.6525))[0], mode=Mode.SUBTRACT)

    # Fillet3
    fillet3_edges = [part.edges().sort_by_distance(p)[0] for p in [
        (0, 1, -13.35),
        (3, 3, -13.35),
        (-3, 3, -13.35),
        (0, 5, -13.35),
        (2.853553391, 4.853553391, -13.35),
        (-2.853553391, 4.853553391, -13.35),
        (-2.853553391, 1.146446609, -13.35),
        (2.853553391, 1.146446609, -13.35),
    ]]
    fillet(fillet3_edges, radius=FILLET3_R)


solid = part.part
